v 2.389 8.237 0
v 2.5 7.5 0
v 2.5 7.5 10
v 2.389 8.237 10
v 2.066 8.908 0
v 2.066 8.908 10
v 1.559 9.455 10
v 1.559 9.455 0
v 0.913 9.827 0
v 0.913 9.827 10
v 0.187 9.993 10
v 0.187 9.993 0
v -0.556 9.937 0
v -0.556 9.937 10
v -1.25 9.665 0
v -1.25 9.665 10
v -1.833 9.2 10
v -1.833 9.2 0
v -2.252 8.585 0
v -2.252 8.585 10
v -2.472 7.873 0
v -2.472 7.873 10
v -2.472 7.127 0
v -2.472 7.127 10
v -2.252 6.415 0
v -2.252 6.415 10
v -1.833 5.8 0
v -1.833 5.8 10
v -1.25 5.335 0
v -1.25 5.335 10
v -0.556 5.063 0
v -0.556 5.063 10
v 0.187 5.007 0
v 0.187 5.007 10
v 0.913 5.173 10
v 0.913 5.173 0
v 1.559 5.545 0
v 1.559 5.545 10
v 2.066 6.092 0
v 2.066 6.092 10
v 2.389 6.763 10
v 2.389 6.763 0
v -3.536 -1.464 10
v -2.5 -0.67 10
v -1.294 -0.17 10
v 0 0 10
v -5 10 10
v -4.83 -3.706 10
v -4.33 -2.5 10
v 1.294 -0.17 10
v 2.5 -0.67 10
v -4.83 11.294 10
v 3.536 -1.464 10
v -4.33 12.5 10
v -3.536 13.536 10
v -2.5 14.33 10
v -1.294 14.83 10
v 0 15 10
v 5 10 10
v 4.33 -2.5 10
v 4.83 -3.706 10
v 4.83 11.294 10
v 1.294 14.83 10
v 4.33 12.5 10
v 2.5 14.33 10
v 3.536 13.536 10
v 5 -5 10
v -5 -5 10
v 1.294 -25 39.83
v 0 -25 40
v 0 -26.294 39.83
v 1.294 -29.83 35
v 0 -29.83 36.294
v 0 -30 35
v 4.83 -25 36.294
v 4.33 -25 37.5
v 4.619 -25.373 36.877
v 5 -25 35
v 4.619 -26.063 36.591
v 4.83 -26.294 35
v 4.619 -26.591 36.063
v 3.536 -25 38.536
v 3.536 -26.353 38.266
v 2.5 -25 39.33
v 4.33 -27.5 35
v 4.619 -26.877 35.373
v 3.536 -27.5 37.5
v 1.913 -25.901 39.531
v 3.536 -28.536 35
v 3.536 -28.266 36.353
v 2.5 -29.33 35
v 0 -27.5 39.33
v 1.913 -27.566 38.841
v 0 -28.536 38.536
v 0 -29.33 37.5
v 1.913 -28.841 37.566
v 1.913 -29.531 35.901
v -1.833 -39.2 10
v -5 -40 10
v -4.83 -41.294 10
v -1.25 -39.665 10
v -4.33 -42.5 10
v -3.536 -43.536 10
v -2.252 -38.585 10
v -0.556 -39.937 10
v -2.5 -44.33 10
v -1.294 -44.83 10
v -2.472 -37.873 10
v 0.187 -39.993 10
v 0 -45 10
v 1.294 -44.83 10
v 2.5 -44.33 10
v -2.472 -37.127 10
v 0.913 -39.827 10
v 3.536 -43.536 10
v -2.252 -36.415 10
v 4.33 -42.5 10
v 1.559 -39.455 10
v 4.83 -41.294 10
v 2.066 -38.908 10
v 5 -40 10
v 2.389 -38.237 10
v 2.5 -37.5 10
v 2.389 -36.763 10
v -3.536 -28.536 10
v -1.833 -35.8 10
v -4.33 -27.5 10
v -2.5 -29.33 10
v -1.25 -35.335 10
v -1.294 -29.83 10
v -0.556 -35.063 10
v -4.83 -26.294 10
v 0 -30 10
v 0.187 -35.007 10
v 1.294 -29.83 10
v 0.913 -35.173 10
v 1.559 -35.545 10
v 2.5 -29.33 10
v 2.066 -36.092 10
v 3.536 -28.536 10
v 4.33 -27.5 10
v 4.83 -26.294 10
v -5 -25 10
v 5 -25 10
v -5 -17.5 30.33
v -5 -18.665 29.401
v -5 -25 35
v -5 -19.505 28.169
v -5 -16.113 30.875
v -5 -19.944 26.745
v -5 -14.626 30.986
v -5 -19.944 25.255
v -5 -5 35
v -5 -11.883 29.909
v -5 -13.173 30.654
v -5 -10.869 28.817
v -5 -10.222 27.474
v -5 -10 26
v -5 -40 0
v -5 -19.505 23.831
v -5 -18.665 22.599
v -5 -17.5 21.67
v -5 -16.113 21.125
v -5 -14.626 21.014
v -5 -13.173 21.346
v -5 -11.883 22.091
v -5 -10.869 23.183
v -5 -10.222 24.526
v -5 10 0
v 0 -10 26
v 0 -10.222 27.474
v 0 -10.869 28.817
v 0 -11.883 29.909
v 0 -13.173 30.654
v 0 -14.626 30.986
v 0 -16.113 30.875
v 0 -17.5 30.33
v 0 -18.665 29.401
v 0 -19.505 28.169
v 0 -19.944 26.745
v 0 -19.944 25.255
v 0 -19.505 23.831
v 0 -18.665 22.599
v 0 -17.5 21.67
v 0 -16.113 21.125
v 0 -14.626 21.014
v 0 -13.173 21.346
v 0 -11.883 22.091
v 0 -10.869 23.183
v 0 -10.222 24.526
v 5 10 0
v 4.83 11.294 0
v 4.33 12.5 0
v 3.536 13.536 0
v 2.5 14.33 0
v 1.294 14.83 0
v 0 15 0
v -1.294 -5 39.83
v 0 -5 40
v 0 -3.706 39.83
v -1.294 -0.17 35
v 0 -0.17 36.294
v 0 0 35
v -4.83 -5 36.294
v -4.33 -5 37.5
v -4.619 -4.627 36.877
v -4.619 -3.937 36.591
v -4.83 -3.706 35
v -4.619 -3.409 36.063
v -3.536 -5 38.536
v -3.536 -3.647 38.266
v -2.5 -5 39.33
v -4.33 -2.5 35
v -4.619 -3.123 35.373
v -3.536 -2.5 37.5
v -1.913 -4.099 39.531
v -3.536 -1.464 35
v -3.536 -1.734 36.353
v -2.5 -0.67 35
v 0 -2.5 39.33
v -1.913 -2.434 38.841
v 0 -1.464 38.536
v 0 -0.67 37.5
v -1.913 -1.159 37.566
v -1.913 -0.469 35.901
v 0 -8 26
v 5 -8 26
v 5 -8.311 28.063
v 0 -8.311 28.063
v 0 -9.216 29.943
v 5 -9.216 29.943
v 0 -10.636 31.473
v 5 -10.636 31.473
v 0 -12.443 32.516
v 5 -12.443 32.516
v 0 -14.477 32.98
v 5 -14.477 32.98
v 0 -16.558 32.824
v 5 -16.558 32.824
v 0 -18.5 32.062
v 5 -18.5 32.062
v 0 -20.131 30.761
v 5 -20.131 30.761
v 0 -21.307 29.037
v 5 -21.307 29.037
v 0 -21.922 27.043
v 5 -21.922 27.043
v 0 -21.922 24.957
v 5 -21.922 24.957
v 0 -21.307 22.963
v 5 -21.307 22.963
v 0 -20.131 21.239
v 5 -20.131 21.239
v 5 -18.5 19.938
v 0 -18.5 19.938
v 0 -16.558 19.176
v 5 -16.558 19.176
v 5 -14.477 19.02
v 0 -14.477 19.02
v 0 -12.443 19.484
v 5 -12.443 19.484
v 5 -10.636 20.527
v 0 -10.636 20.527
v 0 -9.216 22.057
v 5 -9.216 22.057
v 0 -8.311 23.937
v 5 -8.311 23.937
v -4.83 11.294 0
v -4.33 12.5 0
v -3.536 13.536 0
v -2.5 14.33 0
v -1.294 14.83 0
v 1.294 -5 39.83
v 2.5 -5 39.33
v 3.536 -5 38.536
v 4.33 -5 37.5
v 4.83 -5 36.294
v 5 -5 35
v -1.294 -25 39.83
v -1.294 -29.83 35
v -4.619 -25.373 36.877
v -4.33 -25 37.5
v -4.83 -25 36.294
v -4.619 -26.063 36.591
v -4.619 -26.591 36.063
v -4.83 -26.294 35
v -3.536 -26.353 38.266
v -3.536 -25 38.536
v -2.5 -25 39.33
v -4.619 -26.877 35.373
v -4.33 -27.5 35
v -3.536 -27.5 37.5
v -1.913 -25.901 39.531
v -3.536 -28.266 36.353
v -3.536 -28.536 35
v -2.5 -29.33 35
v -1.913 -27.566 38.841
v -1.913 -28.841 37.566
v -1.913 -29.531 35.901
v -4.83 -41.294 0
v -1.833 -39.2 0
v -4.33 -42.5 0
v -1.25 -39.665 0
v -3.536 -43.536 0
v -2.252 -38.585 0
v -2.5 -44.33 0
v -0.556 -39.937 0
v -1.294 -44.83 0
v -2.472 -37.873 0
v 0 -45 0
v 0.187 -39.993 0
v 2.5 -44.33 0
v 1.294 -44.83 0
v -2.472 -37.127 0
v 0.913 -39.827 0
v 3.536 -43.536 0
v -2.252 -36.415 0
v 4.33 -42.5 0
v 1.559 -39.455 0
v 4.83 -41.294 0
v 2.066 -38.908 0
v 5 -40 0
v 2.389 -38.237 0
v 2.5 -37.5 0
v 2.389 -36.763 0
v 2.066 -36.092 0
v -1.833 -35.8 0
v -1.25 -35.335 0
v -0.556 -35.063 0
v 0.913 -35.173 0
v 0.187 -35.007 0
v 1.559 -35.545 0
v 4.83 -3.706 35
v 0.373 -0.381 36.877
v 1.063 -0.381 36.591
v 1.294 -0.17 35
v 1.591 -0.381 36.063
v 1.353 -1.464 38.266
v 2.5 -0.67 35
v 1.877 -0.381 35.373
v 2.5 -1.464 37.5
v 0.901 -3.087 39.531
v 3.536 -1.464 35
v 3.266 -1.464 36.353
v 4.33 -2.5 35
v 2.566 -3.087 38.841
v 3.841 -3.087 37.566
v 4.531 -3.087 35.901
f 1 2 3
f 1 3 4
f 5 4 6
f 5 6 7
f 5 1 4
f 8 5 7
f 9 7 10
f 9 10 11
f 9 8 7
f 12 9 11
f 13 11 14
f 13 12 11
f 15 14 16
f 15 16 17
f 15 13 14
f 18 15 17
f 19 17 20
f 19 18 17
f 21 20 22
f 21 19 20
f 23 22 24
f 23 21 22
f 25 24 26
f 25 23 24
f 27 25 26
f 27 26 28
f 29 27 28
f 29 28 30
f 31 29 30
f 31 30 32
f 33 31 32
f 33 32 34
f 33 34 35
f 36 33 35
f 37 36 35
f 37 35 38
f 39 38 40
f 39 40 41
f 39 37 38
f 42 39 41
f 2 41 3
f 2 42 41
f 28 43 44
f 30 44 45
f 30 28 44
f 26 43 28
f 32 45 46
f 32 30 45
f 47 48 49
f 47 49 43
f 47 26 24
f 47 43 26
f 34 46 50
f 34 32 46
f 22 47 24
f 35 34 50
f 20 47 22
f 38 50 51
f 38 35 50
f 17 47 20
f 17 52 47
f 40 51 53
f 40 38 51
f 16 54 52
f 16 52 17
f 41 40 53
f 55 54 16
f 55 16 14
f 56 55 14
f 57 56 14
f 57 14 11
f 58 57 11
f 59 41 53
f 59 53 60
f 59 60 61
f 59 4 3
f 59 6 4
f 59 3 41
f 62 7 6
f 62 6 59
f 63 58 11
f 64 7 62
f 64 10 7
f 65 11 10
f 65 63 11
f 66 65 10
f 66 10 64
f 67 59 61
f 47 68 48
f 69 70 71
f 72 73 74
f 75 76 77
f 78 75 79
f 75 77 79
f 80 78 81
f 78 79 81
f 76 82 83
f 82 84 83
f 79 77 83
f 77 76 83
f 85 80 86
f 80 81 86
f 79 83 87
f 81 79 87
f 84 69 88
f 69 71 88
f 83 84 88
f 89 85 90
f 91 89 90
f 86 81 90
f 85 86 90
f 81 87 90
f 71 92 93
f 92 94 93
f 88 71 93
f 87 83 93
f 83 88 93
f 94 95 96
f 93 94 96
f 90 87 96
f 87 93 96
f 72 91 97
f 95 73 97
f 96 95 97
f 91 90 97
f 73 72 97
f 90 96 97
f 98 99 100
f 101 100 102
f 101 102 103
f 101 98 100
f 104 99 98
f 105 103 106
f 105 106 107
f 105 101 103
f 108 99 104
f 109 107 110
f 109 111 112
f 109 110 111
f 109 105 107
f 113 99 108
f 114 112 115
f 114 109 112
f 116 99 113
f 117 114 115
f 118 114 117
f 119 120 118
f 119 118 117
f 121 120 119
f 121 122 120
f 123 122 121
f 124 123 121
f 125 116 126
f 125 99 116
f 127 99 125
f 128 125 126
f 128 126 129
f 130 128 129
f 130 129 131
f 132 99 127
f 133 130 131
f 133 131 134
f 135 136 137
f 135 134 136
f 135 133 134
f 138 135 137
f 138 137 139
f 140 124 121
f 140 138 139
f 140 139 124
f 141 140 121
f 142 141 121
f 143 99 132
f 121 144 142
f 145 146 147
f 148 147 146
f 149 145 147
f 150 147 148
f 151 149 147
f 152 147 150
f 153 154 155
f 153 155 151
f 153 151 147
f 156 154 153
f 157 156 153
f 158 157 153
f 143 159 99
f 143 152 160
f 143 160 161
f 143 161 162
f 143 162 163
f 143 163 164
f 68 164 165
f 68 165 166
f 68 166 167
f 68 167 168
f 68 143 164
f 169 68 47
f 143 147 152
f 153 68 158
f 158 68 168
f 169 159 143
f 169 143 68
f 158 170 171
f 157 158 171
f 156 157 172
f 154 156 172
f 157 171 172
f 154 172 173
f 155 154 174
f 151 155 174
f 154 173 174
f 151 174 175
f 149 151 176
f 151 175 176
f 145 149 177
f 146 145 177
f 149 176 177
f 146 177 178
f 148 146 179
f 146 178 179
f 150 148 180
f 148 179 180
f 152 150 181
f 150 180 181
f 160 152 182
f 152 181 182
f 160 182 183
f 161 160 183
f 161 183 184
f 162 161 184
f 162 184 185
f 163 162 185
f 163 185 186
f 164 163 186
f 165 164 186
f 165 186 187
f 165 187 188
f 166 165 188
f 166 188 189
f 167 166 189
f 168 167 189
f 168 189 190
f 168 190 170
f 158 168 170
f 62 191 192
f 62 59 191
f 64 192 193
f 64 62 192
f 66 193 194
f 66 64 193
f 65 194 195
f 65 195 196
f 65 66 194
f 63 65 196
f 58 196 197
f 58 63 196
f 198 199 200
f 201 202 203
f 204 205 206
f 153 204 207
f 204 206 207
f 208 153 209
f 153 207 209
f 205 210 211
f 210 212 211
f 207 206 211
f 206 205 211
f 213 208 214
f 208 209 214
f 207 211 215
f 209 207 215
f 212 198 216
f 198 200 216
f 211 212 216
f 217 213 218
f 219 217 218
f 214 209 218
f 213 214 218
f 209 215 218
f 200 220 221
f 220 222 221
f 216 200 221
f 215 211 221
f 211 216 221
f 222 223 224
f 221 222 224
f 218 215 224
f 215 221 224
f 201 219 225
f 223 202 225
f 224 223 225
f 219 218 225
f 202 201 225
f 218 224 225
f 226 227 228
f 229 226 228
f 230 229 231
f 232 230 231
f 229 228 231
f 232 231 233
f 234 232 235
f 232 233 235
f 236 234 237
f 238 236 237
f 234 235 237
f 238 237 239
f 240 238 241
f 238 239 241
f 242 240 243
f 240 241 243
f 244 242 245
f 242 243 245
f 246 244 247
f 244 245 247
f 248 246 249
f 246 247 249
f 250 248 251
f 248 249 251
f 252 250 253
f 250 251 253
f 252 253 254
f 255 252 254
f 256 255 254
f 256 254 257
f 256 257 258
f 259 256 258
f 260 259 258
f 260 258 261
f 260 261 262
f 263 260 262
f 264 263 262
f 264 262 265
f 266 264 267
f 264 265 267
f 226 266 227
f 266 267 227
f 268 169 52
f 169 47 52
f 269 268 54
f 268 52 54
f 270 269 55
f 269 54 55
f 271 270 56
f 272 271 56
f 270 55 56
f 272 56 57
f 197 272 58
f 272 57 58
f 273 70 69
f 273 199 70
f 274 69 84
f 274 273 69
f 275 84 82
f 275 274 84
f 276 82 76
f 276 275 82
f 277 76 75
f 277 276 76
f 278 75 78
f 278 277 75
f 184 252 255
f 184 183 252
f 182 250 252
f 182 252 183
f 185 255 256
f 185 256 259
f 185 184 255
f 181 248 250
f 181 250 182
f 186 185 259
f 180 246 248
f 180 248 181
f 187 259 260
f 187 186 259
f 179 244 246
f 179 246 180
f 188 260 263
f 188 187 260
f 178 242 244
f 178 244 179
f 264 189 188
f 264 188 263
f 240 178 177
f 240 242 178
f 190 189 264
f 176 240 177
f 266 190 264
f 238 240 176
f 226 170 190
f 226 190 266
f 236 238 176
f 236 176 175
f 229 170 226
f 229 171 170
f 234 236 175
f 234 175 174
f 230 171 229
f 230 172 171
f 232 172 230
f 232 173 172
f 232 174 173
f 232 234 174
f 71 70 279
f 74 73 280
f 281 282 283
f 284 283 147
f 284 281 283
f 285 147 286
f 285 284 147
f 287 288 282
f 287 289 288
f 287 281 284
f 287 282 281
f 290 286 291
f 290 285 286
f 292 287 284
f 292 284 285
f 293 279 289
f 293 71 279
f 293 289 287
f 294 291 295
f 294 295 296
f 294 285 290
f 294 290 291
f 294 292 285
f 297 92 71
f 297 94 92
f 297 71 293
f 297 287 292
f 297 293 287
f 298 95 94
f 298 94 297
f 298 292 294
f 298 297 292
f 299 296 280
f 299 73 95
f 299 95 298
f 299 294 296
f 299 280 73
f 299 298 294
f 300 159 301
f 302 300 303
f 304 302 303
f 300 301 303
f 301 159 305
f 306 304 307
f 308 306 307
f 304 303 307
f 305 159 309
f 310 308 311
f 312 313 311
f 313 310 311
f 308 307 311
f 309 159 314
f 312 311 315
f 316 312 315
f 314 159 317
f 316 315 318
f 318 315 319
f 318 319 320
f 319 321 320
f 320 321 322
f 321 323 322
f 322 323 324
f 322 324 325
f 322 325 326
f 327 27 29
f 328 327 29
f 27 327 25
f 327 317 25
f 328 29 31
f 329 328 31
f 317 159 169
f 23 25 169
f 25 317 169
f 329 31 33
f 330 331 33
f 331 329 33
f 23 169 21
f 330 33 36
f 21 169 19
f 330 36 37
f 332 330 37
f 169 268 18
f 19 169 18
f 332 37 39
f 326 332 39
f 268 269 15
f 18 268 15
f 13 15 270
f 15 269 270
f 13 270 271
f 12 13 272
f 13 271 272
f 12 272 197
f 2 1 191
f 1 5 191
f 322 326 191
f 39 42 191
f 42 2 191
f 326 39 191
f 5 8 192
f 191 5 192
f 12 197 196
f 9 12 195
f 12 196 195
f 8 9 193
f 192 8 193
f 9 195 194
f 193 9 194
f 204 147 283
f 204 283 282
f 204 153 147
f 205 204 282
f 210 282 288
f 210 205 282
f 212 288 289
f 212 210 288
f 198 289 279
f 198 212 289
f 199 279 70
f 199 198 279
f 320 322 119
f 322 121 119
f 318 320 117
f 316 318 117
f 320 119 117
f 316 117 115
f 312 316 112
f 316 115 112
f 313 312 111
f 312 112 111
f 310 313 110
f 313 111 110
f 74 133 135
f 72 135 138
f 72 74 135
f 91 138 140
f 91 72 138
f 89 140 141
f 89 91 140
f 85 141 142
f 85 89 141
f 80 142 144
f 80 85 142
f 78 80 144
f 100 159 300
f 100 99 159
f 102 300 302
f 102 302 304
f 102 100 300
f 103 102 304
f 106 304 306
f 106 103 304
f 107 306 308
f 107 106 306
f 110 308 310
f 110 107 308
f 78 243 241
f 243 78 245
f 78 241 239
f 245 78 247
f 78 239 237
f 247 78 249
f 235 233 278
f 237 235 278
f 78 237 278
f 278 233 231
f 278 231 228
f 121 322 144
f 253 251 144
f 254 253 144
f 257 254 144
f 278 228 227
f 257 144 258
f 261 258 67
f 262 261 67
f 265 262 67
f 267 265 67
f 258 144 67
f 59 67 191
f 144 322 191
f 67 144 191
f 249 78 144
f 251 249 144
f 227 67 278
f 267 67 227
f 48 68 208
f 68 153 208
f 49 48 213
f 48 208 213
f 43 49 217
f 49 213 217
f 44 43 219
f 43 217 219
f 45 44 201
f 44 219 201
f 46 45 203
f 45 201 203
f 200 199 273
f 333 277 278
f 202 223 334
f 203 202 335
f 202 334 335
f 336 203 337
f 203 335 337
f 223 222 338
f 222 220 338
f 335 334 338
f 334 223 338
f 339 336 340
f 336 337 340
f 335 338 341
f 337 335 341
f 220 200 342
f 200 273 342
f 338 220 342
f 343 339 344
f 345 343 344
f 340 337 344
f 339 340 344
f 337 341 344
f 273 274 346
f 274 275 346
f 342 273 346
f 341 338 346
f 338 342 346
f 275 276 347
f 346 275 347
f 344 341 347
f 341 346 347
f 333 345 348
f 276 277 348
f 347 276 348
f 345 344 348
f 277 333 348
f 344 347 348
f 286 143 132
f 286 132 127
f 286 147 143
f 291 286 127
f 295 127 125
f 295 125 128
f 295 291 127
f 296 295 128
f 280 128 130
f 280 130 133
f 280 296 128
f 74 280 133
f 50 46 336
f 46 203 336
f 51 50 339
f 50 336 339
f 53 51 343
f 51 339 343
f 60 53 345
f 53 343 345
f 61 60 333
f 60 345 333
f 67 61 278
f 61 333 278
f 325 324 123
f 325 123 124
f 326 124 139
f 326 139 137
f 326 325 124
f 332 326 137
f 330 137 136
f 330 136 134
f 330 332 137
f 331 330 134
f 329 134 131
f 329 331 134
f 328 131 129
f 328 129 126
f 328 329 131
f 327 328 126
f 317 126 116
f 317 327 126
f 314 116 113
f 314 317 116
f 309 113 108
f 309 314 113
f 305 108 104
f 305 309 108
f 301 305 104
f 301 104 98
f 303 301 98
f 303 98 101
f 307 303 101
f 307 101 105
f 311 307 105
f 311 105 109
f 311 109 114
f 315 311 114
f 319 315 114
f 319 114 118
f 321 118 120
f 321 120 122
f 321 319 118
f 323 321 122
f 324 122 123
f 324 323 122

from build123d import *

# Parameters (mm, degrees)
F0_W     = 10
F0_H     = 30
F1_DEPTH = 40
F0_H_2   = 15
F0_R     = 2.5
F2_DEPTH = 10
F3_R     = 5
F4_DEPTH = 25
F3_R_2   = 7
F5_DEPTH = 5
F6_R     = 4.99999
F7_R     = 4.99999


# Not quite as in the source:
# - a fillet or chamfer is up to 0.001 mm smaller than in the source, because OpenCascade refuses the exact size


with BuildPart() as f1:
    # F0 (on Top) → F1 (new body)
    with BuildSketch(Plane.XY):
        with Locations((0, -15)):
            Rectangle(F0_W, F0_H)
    extrude(amount=F1_DEPTH)

    # F0 (on Top) → F2 (join)
    with BuildSketch(Plane.XY):
        with Locations((0, 7.5)):
            Rectangle(F0_W, F0_H_2)
        with Locations((0, 7.5)):
            Circle(F0_R, mode=Mode.SUBTRACT)
        with Locations((0, -37.5)):
            Rectangle(F0_W, F0_H_2)
        with Locations((0, -37.5)):
            Circle(F0_R, mode=Mode.SUBTRACT)
    extrude(amount=F2_DEPTH)

    # F3 (on face) → F4 (cut)
    with BuildSketch(Plane.YZ.offset(5)):
        with Locations((-15, 26)):
            Circle(F3_R)
    extrude(amount=-F4_DEPTH, mode=Mode.SUBTRACT)

    # F3 (on face) → F5 (cut)
    with BuildSketch(Plane.YZ.offset(5)):
        with Locations((-15, 26)):
            Circle(F3_R_2)
        with Locations((-15, 26)):
            Circle(F3_R, mode=Mode.SUBTRACT)
    extrude(amount=-F5_DEPTH, mode=Mode.SUBTRACT)

    # F6 (radius 5 in the source; OpenCascade refuses exactly that, so slightly less here)
    f6_edges = [f1.edges().sort_by_distance(p)[0] for p in [
        (0, -30, 40),
        (5, -15, 40),
        (0, 0, 40),
        (-5, -15, 40),
        (5, 0, 25),
        (5, -30, 25),
        (-5, -30, 25),
        (-5, 0, 25),
    ]]
    fillet(f6_edges, radius=F6_R)

    # F7 (radius 5 in the source; OpenCascade refuses exactly that, so slightly less here)
    f7_edges = [f1.edges().sort_by_distance(p)[0] for p in [
        (5, 15, 5),
        (-5, 15, 5),
        (5, -45, 5),
        (-5, -45, 5),
    ]]
    fillet(f7_edges, radius=F7_R)


solid = f1.part
